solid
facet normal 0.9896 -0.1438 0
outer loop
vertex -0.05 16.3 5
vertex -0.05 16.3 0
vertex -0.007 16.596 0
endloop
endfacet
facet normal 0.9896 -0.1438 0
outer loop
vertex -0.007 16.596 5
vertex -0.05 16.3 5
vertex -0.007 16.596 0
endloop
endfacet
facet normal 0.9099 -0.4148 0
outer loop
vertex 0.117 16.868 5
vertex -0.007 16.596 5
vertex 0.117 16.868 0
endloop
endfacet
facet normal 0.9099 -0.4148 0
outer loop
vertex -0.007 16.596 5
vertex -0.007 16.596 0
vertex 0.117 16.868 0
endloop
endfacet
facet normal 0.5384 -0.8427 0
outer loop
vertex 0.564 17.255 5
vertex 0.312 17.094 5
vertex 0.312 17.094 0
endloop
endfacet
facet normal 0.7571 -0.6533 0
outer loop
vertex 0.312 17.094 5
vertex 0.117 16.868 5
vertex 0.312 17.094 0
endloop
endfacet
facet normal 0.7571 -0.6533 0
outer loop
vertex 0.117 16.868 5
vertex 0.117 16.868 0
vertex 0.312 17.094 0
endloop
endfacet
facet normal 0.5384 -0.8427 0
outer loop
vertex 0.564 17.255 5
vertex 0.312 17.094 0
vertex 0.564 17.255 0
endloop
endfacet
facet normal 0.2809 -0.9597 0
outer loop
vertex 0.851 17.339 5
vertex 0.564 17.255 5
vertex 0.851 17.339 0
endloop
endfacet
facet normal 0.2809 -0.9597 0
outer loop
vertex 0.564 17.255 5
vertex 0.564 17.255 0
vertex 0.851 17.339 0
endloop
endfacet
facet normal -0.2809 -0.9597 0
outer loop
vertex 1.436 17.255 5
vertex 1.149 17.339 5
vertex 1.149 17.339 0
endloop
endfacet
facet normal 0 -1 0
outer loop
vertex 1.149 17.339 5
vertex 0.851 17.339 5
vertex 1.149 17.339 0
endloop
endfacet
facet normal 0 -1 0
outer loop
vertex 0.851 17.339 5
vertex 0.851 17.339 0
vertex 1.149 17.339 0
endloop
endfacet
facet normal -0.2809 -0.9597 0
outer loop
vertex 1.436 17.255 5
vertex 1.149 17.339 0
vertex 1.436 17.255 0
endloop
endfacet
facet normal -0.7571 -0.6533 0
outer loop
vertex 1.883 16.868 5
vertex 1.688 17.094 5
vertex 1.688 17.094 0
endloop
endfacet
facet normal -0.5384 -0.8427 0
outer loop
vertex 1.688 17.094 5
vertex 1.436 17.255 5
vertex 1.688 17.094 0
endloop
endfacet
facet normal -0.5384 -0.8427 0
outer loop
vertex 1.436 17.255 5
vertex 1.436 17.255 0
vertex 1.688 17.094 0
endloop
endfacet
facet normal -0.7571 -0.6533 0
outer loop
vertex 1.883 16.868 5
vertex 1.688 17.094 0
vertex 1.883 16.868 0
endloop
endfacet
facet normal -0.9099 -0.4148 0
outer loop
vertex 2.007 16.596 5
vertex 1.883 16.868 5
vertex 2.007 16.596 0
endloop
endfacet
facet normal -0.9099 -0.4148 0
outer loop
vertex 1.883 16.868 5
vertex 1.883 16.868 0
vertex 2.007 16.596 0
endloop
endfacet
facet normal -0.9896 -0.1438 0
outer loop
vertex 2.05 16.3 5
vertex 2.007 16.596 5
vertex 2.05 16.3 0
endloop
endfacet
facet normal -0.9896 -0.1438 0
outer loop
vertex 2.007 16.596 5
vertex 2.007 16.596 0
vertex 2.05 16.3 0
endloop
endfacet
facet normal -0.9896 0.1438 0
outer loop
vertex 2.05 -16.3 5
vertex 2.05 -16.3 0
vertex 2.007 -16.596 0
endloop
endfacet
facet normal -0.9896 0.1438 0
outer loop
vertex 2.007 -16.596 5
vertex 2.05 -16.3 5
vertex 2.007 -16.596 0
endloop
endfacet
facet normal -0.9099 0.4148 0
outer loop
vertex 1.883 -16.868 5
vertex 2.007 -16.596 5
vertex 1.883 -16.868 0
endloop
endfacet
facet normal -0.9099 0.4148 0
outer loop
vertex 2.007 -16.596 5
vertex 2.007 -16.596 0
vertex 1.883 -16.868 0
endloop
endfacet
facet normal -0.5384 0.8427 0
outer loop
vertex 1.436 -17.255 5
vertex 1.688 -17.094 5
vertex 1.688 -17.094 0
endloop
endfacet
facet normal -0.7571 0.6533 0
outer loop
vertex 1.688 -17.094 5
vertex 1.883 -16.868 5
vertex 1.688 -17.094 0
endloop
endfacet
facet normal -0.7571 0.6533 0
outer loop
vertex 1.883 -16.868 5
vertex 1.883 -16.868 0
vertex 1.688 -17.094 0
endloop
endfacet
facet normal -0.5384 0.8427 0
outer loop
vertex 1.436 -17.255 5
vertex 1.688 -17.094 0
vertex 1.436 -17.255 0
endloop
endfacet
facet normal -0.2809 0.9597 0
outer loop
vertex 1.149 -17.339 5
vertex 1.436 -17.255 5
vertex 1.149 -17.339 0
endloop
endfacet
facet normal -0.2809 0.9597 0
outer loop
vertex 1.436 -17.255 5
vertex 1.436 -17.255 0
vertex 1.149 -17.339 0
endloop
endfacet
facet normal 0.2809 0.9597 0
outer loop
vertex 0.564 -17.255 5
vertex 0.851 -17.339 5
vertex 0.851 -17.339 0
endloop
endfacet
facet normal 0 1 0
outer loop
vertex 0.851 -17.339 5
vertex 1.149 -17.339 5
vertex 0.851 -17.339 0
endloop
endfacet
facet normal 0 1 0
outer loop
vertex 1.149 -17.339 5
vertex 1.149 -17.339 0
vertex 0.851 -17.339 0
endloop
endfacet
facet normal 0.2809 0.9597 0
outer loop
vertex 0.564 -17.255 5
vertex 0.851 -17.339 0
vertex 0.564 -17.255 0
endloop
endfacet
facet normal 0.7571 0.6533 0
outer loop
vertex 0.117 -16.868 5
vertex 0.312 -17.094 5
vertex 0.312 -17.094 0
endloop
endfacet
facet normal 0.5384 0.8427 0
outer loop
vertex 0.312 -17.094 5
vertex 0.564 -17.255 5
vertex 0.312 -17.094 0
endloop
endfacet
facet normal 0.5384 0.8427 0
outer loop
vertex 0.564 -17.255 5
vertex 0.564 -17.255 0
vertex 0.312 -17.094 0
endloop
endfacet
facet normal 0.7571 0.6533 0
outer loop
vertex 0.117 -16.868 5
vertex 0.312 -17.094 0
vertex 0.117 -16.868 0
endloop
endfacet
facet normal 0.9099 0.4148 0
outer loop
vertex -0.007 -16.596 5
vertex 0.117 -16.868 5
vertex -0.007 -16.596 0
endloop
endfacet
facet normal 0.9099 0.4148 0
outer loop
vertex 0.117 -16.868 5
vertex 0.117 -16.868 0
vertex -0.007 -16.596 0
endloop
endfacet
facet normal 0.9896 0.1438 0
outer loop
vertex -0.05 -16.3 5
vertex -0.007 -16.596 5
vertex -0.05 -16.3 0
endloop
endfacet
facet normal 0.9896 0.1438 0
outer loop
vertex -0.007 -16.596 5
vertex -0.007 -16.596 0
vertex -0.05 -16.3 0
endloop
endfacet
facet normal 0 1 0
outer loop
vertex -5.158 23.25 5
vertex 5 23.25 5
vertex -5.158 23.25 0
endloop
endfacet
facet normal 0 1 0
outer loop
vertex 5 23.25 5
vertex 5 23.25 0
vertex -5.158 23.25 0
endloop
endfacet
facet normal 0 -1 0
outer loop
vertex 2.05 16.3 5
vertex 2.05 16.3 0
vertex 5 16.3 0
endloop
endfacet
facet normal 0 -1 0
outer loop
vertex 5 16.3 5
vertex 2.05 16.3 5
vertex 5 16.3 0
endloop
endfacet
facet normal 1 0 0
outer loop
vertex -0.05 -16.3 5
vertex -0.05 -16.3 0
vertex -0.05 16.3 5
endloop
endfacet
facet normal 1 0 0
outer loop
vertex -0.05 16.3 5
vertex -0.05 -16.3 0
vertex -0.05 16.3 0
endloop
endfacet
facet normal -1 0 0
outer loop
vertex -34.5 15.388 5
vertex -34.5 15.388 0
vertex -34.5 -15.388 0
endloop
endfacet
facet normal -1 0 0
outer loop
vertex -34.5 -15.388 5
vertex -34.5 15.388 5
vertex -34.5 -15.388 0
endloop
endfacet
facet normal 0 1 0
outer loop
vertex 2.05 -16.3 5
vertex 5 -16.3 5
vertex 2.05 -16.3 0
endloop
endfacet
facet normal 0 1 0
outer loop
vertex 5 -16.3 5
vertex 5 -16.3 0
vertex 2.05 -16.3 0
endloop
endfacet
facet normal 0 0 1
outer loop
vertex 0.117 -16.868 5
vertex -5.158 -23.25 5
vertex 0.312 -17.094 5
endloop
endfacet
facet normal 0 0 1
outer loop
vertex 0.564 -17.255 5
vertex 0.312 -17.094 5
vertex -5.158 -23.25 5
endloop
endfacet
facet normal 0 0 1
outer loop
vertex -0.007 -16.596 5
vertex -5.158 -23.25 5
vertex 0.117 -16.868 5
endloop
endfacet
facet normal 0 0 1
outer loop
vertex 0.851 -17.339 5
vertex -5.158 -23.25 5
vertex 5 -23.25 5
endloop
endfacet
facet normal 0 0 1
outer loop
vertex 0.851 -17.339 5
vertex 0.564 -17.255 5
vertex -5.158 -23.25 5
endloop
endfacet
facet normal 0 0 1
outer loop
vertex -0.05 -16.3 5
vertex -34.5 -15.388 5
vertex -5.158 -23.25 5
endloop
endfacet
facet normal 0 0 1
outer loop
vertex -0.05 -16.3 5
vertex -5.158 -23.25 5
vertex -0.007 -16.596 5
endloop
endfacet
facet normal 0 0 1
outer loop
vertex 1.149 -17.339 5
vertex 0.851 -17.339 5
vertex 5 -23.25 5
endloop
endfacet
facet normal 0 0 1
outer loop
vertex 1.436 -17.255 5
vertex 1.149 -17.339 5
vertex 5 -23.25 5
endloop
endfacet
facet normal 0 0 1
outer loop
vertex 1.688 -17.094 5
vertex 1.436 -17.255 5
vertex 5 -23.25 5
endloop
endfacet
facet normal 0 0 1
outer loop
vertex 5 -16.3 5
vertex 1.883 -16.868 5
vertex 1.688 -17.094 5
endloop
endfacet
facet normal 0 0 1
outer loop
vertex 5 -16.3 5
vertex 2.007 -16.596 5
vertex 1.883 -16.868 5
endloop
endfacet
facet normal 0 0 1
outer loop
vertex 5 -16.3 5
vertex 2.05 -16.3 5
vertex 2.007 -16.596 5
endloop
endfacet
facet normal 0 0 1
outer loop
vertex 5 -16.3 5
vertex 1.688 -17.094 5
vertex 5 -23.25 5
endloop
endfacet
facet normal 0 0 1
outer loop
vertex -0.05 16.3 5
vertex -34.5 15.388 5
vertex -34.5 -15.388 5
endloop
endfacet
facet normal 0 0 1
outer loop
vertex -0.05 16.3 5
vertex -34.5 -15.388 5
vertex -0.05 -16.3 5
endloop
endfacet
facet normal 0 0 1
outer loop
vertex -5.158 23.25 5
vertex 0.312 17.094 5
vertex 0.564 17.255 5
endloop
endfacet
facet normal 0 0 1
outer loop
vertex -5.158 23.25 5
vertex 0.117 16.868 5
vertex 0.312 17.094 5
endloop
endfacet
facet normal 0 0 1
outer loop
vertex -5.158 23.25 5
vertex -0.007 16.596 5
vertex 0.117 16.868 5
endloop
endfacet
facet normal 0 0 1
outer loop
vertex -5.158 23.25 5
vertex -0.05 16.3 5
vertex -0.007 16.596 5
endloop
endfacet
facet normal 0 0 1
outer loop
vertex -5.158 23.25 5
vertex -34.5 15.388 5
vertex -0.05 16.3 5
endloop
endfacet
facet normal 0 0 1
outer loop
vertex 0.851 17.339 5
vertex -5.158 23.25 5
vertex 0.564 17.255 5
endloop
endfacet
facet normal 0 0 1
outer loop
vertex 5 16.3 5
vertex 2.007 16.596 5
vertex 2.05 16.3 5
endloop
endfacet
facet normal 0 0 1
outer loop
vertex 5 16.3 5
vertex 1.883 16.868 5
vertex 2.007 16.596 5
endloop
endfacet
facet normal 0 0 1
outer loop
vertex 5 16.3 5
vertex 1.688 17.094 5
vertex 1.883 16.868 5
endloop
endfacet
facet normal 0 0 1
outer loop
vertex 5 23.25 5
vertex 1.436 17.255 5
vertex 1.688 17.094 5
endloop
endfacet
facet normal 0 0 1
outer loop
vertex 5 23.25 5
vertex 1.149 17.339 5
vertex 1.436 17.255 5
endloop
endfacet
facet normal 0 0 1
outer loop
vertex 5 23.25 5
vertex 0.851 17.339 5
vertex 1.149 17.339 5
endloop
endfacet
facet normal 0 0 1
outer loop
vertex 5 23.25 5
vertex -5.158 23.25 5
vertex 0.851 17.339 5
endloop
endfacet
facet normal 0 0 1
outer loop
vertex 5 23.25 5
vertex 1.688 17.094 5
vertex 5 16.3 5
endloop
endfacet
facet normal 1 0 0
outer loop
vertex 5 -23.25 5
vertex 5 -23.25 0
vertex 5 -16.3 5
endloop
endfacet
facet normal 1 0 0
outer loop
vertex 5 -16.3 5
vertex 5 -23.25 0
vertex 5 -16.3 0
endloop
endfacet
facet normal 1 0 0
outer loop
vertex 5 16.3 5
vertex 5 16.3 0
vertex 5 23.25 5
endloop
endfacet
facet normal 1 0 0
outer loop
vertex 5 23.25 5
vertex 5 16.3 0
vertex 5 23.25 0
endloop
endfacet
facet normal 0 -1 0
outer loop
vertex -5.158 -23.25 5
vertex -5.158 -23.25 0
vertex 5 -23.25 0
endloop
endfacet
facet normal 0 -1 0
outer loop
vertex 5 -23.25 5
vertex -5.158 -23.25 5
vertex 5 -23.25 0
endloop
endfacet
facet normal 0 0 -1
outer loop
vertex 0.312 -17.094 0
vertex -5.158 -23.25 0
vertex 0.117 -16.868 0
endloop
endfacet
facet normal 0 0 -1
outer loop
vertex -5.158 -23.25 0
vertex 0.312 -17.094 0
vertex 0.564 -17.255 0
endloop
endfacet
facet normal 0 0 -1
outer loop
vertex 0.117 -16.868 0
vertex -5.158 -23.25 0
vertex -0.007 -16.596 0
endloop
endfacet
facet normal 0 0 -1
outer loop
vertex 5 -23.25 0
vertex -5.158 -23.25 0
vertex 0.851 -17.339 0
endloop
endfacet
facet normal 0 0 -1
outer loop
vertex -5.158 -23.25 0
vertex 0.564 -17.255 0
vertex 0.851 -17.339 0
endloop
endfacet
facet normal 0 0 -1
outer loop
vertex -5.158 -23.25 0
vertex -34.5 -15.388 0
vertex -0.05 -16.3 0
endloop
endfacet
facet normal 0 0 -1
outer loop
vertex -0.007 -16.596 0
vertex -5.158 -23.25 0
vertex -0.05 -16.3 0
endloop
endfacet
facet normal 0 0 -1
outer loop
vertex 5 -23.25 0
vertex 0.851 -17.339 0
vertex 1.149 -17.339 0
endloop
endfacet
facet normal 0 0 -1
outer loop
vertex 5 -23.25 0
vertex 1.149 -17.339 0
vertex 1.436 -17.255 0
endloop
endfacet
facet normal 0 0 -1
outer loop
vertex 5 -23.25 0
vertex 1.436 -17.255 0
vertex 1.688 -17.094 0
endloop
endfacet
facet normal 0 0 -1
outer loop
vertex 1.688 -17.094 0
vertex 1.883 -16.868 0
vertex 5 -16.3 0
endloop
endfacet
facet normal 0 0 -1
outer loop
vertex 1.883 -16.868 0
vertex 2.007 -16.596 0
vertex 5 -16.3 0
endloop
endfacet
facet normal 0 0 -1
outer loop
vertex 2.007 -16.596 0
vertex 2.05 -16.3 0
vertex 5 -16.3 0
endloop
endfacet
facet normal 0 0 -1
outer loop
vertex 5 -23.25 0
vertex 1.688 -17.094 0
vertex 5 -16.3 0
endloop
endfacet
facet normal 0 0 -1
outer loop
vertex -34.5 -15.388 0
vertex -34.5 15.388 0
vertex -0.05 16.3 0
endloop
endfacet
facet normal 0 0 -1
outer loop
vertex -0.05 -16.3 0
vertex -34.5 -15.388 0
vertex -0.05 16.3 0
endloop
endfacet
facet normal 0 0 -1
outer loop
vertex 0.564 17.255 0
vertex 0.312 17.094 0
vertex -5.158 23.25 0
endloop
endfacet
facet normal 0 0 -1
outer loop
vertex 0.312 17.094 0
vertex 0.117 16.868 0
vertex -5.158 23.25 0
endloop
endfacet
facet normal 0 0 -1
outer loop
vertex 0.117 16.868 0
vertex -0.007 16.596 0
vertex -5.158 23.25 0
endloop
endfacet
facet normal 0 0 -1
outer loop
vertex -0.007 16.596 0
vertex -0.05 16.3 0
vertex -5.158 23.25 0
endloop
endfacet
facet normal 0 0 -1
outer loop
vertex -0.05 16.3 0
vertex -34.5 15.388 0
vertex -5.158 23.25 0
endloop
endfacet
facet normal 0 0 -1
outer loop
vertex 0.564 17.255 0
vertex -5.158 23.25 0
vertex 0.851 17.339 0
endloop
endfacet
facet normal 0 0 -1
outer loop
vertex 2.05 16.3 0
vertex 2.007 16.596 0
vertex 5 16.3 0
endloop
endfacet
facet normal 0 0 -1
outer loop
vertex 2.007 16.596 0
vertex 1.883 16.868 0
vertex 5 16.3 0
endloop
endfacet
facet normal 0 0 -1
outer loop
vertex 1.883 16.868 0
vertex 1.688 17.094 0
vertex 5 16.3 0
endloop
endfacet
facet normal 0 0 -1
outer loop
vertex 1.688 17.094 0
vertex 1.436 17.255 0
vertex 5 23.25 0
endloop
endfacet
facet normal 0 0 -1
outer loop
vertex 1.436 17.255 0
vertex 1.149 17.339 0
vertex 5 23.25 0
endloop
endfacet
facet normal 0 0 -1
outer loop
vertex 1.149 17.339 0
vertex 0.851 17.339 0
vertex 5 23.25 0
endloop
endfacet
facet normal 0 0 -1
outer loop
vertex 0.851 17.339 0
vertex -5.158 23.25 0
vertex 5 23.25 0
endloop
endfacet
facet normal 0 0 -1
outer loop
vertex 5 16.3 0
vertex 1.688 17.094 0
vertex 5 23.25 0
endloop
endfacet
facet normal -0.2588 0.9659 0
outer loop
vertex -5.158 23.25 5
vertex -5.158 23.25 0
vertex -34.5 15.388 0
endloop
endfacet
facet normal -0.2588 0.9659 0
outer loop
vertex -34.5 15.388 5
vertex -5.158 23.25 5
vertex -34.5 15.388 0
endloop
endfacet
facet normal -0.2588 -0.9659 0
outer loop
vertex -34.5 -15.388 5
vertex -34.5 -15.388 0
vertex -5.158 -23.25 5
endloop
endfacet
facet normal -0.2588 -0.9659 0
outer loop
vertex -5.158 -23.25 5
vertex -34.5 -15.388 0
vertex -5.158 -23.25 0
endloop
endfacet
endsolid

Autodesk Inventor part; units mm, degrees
ref_plane "YZ Plane" through (0, 0, 0) normal (1, 0, 0) x (0, 1, 0)
ref_plane "XZ Plane" through (0, 0, 0) normal (0, 1, 0) x (-1, 0, 0)
ref_plane "XY Plane" through (0, 0, 0) normal (0, 0, 1) x (1, 0, 0)
sketch "スケッチ1" plane through (0, 0, 0) normal (0, 0, 1) x (1, 0, 0)
  line L0 (0, 16.25) -> (28.4656, 16.25) construction
  line L1 (28.4656, 16.25) -> (28.4656, -16.25) construction
  line L2 (28.4656, -16.25) -> (0, -16.25) construction
  line L3 (0, -16.25) -> (0, 16.25) construction
  line L4 (5, 23.25) -> (-5.1583, 23.25)
  line L5 (-5.1583, 23.25) -> (-34.5, 15.3879)
  line L6 (-34.5, 15.3879) -> (-34.5, -15.3879)
  line L7 (-34.5, -15.3879) -> (-5.1583, -23.25)
  line L8 (-5.1583, -23.25) -> (5, -23.25)
  line L9 (5, -23.25) -> (5, -16.3)
  line L10 (5, -16.3) -> (2.05, -16.3)
  arc A0 (-0.05, -16.3) -> (2.05, -16.3) centre (1, -16.3) ccw
  line L11 (-0.05, -16.3) -> (-0.05, 16.3)
  arc A1 (2.05, 16.3) -> (-0.05, 16.3) centre (1, 16.3) ccw
  line L12 (28.4656, 0) -> (0, 0) construction
  line L13 (2.05, 16.3) -> (5, 16.3)
  line L14 (5, 16.3) -> (5, 23.25)
  line L15 (28.5156, 16.3) -> (-0.05, 16.3) construction
  line L16 (-0.05, 16.3) -> (-0.05, -16.3) construction
  line L17 (-0.05, -16.3) -> (28.5156, -16.3) construction
  line L18 (28.5156, -16.3) -> (28.5156, 16.3) construction
  circle A2 centre (-4.5, 18.25) radius 1.2
  circle A3 centre (-4.5, -18.25) radius 1.2
  line L19 (0, 0) -> (28.4656, 0) construction
  line L20 (2.5, 16.25) -> (2.5, -16.25) construction
  circle A4 centre (-4.5, 18.25) radius 5 construction
  line L21 (-6.0877, 15.5) -> (-7.6754, 18.25)
  line L22 (-7.6754, 18.25) -> (-6.0877, 21)
  line L23 (-6.0877, 21) -> (-2.9123, 21)
  line L24 (-2.9123, 21) -> (-1.3246, 18.25)
  line L25 (-1.3246, 18.25) -> (-2.9123, 15.5)
  line L26 (-2.9123, 15.5) -> (-6.0877, 15.5)
  point P0 (-34.5, 0)
  point P1 (-0.05, 0)
  dimension "d98" = 32.5
  dimension "d100" = 0.05
  dimension "d101" = 1.05
  dimension "d102" = 5
  dimension "d104" = 2.4
  dimension "d106" = 2.5
  dimension "d107" = 7
  dimension "d108" = 18.25
  dimension "d109" = 5
  dimension "d110" = 30
  dimension "d111" = 165
  dimension "d130" = 5.5
extrude "押し出し1" add sketch "スケッチ1" along normal blind 5 contours L14 L13 A1 L11 A0 L10 L9 L8 L7 L6 L5 L4 | L21 L22 L23 L24 L25 L26
sketch "スケッチ8" plane through (0, 0, 0) normal (0, 0, -1) x (-1, 0, 0)
  circle A0 centre (4.5, 18.25) radius 1.2 projected
  circle A1 centre (4.5, 18.25) radius 1.2
  circle A2 centre (4.5, -18.25) radius 1.2 projected
  circle A3 centre (4.5, -18.25) radius 1.2
  point P0 (0, 0)
extrude "押し出し6" add sketch "スケッチ8" against normal up to surface (5 mm away)
properties part number "胴体_サブフレーム_1_7" material "アセタール樹脂、黒"
